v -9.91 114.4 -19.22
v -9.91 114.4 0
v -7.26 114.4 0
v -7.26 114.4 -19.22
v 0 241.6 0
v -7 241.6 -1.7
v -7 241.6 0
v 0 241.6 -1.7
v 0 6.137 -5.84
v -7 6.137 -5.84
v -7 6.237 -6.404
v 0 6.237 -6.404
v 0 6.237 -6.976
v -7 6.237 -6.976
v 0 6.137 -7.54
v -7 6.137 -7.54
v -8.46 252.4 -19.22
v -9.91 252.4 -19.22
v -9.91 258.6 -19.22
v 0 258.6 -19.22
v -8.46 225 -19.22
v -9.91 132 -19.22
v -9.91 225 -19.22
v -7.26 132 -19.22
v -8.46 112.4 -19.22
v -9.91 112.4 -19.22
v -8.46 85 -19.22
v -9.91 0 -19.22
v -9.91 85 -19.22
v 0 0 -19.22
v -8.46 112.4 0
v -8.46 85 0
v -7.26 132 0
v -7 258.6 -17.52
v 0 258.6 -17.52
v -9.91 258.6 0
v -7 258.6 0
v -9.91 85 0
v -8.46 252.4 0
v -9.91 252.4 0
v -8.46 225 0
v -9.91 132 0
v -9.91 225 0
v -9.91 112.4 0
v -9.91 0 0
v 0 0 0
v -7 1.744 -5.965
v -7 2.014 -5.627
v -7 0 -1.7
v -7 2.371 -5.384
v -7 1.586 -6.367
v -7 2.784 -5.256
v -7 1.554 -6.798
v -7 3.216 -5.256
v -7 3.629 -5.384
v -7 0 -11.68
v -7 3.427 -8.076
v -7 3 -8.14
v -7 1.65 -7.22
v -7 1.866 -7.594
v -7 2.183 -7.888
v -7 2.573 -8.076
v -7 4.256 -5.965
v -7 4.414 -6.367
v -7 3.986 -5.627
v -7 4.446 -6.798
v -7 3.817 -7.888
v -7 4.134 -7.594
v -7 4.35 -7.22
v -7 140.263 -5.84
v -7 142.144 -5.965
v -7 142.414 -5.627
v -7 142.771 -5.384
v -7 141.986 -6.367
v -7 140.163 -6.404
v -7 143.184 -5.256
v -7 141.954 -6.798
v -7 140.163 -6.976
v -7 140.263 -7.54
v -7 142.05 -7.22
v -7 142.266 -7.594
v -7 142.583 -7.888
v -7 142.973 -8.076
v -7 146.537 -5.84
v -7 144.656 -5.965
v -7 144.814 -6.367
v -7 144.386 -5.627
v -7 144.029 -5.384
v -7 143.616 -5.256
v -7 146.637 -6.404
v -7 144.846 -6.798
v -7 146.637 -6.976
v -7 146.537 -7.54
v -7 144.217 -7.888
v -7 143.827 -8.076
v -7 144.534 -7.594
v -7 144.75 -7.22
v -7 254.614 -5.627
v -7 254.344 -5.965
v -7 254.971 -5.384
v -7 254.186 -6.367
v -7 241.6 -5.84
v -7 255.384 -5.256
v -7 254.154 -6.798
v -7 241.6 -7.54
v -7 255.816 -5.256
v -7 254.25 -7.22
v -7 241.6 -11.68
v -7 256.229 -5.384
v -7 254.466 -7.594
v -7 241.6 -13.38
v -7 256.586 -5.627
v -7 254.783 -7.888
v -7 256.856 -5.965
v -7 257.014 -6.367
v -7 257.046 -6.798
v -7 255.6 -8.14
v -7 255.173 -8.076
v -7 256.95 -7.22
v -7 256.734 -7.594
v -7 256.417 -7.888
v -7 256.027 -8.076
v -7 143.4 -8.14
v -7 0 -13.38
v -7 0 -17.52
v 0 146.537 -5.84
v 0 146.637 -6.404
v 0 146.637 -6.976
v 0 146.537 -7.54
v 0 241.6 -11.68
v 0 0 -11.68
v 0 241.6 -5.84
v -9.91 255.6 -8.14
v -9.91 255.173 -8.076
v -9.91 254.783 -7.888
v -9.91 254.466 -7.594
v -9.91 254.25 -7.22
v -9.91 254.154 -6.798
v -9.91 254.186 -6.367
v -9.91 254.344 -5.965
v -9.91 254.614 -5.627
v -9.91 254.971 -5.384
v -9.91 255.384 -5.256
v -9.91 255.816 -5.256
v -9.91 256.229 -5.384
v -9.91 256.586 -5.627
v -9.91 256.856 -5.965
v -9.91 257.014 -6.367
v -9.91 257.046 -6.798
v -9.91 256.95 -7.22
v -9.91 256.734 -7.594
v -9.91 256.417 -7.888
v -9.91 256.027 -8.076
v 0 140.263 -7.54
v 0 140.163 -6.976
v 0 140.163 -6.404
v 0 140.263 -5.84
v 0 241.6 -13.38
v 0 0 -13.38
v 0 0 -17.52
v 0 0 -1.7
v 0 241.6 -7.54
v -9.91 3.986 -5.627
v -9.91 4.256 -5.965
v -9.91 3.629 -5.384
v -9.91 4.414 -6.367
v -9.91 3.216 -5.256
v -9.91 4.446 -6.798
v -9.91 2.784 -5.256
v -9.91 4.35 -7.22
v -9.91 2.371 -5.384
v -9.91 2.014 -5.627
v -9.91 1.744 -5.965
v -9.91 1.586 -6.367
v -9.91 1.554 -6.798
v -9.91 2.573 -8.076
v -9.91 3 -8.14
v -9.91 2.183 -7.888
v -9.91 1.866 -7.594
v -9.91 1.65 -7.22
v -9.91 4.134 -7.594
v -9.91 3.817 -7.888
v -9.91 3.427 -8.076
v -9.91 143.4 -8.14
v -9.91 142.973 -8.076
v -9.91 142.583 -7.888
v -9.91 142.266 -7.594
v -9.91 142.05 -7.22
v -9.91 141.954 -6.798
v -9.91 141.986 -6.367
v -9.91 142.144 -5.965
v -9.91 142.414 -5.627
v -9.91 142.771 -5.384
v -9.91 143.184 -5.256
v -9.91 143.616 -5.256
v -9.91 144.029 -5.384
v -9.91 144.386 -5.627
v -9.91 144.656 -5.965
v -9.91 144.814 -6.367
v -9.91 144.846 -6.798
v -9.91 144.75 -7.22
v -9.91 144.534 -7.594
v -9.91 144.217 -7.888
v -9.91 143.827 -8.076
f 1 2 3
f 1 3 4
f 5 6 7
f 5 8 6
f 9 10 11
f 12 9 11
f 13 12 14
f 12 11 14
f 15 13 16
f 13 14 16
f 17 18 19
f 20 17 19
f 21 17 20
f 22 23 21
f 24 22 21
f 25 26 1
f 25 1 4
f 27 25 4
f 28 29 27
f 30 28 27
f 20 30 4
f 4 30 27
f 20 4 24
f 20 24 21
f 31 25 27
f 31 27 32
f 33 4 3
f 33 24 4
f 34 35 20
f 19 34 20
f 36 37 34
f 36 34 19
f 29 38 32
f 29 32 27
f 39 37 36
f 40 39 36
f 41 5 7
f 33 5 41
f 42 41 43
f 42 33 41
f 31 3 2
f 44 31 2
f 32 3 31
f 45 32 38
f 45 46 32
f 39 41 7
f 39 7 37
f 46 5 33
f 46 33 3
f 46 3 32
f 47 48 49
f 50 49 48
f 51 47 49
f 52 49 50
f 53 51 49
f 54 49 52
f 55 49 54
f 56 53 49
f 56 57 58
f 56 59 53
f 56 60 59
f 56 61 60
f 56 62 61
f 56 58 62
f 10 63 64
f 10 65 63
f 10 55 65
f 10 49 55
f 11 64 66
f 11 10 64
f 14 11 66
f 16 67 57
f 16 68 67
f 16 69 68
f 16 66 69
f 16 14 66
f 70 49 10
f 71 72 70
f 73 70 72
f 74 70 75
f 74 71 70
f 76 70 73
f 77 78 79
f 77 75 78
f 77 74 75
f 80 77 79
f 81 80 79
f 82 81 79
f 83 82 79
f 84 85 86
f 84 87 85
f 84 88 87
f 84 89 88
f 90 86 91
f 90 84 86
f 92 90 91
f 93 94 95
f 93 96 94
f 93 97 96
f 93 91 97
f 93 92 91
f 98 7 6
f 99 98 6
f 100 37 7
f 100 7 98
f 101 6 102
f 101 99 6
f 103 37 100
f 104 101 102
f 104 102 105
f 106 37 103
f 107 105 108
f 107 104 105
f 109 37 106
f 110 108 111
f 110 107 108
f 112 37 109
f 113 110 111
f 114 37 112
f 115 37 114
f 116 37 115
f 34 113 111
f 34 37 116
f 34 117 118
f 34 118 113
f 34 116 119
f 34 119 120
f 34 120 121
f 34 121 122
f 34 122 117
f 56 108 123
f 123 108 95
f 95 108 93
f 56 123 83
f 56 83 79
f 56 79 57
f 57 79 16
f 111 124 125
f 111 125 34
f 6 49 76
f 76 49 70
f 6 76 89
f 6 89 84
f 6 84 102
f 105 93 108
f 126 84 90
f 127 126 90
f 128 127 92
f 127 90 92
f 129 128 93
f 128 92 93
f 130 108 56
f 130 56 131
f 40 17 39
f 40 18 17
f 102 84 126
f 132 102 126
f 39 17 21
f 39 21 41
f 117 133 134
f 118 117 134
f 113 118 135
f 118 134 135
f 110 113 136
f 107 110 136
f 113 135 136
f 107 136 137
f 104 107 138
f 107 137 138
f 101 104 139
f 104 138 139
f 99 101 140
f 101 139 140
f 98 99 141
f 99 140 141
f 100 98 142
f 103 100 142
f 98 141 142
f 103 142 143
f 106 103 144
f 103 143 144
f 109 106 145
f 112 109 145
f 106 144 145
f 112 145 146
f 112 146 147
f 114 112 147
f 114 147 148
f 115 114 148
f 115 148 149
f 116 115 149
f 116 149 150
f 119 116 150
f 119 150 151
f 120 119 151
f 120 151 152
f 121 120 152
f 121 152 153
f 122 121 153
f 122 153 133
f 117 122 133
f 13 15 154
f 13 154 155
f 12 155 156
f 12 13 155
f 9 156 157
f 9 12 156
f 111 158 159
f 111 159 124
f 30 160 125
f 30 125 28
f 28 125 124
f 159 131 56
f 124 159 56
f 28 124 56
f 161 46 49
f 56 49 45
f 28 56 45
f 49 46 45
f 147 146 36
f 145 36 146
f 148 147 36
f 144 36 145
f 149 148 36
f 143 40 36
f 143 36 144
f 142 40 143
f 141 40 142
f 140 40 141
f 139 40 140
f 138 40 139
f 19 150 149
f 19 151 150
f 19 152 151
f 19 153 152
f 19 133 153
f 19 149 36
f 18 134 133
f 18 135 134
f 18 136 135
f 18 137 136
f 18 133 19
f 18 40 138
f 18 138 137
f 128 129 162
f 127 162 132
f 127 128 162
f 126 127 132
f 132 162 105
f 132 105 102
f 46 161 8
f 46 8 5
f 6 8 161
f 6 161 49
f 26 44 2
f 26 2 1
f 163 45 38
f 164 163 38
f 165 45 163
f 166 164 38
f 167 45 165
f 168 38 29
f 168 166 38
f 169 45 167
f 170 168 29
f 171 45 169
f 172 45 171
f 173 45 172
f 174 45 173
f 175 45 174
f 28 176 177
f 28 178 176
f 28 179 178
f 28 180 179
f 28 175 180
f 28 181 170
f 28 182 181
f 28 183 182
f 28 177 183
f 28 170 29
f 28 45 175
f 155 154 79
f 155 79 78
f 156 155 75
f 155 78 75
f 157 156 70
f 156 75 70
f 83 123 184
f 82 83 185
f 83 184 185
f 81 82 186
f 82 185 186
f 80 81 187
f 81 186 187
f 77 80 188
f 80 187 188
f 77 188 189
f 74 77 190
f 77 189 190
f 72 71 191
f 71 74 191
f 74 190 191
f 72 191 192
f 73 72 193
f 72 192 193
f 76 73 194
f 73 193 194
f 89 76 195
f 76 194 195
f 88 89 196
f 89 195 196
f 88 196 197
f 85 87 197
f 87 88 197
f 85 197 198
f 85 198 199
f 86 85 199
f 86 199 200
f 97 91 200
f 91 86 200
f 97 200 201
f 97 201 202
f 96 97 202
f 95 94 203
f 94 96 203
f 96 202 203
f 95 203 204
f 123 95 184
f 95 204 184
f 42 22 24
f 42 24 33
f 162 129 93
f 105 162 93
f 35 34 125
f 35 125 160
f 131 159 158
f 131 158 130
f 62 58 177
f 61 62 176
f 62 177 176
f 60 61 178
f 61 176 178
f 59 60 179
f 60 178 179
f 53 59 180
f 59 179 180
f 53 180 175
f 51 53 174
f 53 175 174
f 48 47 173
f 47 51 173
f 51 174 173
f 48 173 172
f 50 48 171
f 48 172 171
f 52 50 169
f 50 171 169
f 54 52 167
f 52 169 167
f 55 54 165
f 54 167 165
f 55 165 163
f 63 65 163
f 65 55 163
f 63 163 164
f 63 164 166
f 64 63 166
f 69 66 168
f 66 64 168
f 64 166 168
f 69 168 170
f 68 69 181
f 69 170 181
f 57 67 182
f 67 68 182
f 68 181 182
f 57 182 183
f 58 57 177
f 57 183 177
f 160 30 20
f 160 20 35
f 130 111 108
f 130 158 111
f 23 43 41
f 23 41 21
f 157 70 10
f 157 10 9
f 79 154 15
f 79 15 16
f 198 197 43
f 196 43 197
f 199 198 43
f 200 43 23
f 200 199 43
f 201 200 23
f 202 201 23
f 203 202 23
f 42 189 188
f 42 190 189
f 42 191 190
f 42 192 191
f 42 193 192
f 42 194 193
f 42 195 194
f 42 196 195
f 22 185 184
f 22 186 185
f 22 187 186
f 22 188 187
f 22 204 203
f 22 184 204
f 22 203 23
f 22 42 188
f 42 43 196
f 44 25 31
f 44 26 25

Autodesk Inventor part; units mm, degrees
ref_plane "YZ Plane" through (0, 0, 0) normal (1, 0, 0) x (0, 1, 0)
ref_plane "XZ Plane" through (0, 0, 0) normal (0, 1, 0) x (-1, 0, 0)
ref_plane "XY Plane" through (0, 0, 0) normal (0, 0, 1) x (1, 0, 0)
sketch "Sketch1" plane through (0, 0, 0) normal (0, 1, 0) x (-1, 0, 0)
  line L0 (0, 0) -> (9.91, 0)
  line L1 (9.91, 0) -> (9.91, -19.22)
  line L2 (9.91, -19.22) -> (0, -19.22)
  line L3 (0, -19.22) -> (0, 0)
  dimension "d0" = 19.22
  dimension "d1" = 9.91
extrude "Extrusion1" add sketch "Sketch1" along normal blind 258.6
sketch "Sketch2" plane through (0, 0, 0) normal (0, -1, 0) x (1, 0, 0)
  line L0 (0, -1.7) -> (-7, -1.7)
  line L1 (-7, -1.7) -> (-7, -5.84)
  line L2 (-7, -5.84) -> (0, -5.84)
  line L3 (0, -5.84) -> (0, -1.7)
  line L4 (0, 0) -> (-9.91, 0) projected
  line L5 (0, -19.22) -> (0, 0) projected
  dimension "d31" = 1.7
  dimension "d32" = 4.14
  dimension "d33" = 7
extrude "Extrusion2" cut sketch "Sketch2" against normal through all
sketch "Sketch3" plane through (0, 0, 0) normal (0, -1, 0) x (1, 0, 0)
  line L0 (0, -7.54) -> (-7, -7.54)
  line L1 (-7, -7.54) -> (-7, -11.68)
  line L2 (-7, -11.68) -> (0, -11.68)
  line L3 (0, -11.68) -> (0, -7.54)
  line L4 (0, -5.84) -> (-7, -5.84) projected
  line L5 (-7, -5.84) -> (-7, -1.7) projected
  point P0 (0, 0)
  dimension "d39" = 1.7
  dimension "d40" = 4.14
extrude "Extrusion3" cut sketch "Sketch3" against normal through all
sketch "Sketch4" plane through (0, 0, 0) normal (0, -1, 0) x (1, 0, 0)
  line L0 (0, -13.38) -> (-7, -13.38)
  line L1 (-7, -13.38) -> (-7, -17.52)
  line L2 (-7, -17.52) -> (0, -17.52)
  line L3 (0, -17.52) -> (0, -13.38)
  line L4 (0, -11.68) -> (-7, -11.68) projected
  line L5 (-7, -11.68) -> (-7, -7.54) projected
  point P0 (0, 0)
  dimension "d43" = 1.7
  dimension "d44" = 4.14
extrude "Extrusion4" cut sketch "Sketch4" against normal through all
hole "Hole7" at (0, 3, -6.69) direction (-1, 0, 0) diameter 2.9 end through all counterbore diameter 6.5 counterbore depth 7 clearance for "Socket Head Cap Screw" size "M2.5" standard "Ansi Metric M Profile"
hole "Hole8" at (0, 143.4, -6.69) direction (-1, 0, 0) diameter 2.9 end through all counterbore diameter 6.5 counterbore depth 7 clearance for "Socket Head Cap Screw" size "M2.5" standard "Ansi Metric M Profile"
sketch "Sketch5" plane through (0, 0, 0) normal (1, 0, 0) x (0, 0, -1)
  line L0 (0, 0) -> (0, 258.6) projected
  line L1 (13.38, 0) -> (13.38, 258.6) projected
  line L2 (0, 258.6) -> (13.38, 258.6)
  line L3 (13.38, 258.6) -> (13.38, 241.6)
  line L4 (13.38, 241.6) -> (0, 241.6)
  line L5 (0, 241.6) -> (0, 258.6)
  point P0 (13.38, 146.5369)
  point P1 (13.38, 6.1369)
  dimension "d128" = 17
extrude "Extrusion5" cut sketch "Sketch5" against normal up to surface (7 mm away)
hole "Hole13" at (-7, 255.6, -6.69) direction (-1, 0, 0) diameter 2.9 end through all
sketch "Sketch6" plane through (-9.91, 0, -19.22) normal (-1, 0, 0) x (0, 0, 1)
  line L0 (0, 0) -> (0, 258.6) projected
  line L1 (19.22, 0) -> (19.22, 258.6) projected
  line L2 (0, 112.4) -> (19.22, 112.4)
  line L3 (19.22, 112.4) -> (19.22, 85)
  line L4 (19.22, 85) -> (0, 85)
  line L5 (0, 85) -> (0, 112.4)
  line L6 (19.22, 0) -> (0, 0) projected
  dimension "d149" = 85
  dimension "d150" = 112.4
extrude "Extrusion6" cut sketch "Sketch6" against normal blind 1.45 contours L0 L2 L1 L4
sketch "Sketch7" plane through (-9.91, 258.6, -19.22) normal (-1, 0, 0) x (0, 0, 1)
  line L0 (0, -258.6) -> (0, 0) projected
  line L1 (19.22, -258.6) -> (19.22, -17) projected
  line L2 (0, -126.6) -> (19.22, -126.6)
  line L3 (19.22, -126.6) -> (19.22, -144.2)
  line L4 (19.22, -144.2) -> (0, -144.2)
  line L5 (0, -144.2) -> (0, -126.6)
  line L6 (19.22, -258.6) -> (0, -258.6) projected
  dimension "d153" = 132
  dimension "d154" = 114.4
extrude "Extrusion7" cut sketch "Sketch7" against normal blind 2.65 contours L0 L2 L1 L4
sketch "Sketch8" plane through (-9.91, 258.6, -19.22) normal (-1, 0, 0) x (0, 0, 1)
  line L0 (0, -258.6) -> (0, 0) projected
  line L1 (19.22, -258.6) -> (19.22, -17) projected
  line L2 (0, -6.2) -> (19.22, -6.2)
  line L3 (19.22, -6.2) -> (19.22, -33.6)
  line L4 (19.22, -33.6) -> (0, -33.6)
  line L5 (0, -33.6) -> (0, -6.2)
  line L6 (19.22, -258.6) -> (0, -258.6) projected
  dimension "d157" = 225
  dimension "d158" = 252.4
extrude "Extrusion8" cut sketch "Sketch8" against normal blind 1.45 contours L0 L2 L3 L1 L4
properties part number "6089-110_FF_left_heatsink"
